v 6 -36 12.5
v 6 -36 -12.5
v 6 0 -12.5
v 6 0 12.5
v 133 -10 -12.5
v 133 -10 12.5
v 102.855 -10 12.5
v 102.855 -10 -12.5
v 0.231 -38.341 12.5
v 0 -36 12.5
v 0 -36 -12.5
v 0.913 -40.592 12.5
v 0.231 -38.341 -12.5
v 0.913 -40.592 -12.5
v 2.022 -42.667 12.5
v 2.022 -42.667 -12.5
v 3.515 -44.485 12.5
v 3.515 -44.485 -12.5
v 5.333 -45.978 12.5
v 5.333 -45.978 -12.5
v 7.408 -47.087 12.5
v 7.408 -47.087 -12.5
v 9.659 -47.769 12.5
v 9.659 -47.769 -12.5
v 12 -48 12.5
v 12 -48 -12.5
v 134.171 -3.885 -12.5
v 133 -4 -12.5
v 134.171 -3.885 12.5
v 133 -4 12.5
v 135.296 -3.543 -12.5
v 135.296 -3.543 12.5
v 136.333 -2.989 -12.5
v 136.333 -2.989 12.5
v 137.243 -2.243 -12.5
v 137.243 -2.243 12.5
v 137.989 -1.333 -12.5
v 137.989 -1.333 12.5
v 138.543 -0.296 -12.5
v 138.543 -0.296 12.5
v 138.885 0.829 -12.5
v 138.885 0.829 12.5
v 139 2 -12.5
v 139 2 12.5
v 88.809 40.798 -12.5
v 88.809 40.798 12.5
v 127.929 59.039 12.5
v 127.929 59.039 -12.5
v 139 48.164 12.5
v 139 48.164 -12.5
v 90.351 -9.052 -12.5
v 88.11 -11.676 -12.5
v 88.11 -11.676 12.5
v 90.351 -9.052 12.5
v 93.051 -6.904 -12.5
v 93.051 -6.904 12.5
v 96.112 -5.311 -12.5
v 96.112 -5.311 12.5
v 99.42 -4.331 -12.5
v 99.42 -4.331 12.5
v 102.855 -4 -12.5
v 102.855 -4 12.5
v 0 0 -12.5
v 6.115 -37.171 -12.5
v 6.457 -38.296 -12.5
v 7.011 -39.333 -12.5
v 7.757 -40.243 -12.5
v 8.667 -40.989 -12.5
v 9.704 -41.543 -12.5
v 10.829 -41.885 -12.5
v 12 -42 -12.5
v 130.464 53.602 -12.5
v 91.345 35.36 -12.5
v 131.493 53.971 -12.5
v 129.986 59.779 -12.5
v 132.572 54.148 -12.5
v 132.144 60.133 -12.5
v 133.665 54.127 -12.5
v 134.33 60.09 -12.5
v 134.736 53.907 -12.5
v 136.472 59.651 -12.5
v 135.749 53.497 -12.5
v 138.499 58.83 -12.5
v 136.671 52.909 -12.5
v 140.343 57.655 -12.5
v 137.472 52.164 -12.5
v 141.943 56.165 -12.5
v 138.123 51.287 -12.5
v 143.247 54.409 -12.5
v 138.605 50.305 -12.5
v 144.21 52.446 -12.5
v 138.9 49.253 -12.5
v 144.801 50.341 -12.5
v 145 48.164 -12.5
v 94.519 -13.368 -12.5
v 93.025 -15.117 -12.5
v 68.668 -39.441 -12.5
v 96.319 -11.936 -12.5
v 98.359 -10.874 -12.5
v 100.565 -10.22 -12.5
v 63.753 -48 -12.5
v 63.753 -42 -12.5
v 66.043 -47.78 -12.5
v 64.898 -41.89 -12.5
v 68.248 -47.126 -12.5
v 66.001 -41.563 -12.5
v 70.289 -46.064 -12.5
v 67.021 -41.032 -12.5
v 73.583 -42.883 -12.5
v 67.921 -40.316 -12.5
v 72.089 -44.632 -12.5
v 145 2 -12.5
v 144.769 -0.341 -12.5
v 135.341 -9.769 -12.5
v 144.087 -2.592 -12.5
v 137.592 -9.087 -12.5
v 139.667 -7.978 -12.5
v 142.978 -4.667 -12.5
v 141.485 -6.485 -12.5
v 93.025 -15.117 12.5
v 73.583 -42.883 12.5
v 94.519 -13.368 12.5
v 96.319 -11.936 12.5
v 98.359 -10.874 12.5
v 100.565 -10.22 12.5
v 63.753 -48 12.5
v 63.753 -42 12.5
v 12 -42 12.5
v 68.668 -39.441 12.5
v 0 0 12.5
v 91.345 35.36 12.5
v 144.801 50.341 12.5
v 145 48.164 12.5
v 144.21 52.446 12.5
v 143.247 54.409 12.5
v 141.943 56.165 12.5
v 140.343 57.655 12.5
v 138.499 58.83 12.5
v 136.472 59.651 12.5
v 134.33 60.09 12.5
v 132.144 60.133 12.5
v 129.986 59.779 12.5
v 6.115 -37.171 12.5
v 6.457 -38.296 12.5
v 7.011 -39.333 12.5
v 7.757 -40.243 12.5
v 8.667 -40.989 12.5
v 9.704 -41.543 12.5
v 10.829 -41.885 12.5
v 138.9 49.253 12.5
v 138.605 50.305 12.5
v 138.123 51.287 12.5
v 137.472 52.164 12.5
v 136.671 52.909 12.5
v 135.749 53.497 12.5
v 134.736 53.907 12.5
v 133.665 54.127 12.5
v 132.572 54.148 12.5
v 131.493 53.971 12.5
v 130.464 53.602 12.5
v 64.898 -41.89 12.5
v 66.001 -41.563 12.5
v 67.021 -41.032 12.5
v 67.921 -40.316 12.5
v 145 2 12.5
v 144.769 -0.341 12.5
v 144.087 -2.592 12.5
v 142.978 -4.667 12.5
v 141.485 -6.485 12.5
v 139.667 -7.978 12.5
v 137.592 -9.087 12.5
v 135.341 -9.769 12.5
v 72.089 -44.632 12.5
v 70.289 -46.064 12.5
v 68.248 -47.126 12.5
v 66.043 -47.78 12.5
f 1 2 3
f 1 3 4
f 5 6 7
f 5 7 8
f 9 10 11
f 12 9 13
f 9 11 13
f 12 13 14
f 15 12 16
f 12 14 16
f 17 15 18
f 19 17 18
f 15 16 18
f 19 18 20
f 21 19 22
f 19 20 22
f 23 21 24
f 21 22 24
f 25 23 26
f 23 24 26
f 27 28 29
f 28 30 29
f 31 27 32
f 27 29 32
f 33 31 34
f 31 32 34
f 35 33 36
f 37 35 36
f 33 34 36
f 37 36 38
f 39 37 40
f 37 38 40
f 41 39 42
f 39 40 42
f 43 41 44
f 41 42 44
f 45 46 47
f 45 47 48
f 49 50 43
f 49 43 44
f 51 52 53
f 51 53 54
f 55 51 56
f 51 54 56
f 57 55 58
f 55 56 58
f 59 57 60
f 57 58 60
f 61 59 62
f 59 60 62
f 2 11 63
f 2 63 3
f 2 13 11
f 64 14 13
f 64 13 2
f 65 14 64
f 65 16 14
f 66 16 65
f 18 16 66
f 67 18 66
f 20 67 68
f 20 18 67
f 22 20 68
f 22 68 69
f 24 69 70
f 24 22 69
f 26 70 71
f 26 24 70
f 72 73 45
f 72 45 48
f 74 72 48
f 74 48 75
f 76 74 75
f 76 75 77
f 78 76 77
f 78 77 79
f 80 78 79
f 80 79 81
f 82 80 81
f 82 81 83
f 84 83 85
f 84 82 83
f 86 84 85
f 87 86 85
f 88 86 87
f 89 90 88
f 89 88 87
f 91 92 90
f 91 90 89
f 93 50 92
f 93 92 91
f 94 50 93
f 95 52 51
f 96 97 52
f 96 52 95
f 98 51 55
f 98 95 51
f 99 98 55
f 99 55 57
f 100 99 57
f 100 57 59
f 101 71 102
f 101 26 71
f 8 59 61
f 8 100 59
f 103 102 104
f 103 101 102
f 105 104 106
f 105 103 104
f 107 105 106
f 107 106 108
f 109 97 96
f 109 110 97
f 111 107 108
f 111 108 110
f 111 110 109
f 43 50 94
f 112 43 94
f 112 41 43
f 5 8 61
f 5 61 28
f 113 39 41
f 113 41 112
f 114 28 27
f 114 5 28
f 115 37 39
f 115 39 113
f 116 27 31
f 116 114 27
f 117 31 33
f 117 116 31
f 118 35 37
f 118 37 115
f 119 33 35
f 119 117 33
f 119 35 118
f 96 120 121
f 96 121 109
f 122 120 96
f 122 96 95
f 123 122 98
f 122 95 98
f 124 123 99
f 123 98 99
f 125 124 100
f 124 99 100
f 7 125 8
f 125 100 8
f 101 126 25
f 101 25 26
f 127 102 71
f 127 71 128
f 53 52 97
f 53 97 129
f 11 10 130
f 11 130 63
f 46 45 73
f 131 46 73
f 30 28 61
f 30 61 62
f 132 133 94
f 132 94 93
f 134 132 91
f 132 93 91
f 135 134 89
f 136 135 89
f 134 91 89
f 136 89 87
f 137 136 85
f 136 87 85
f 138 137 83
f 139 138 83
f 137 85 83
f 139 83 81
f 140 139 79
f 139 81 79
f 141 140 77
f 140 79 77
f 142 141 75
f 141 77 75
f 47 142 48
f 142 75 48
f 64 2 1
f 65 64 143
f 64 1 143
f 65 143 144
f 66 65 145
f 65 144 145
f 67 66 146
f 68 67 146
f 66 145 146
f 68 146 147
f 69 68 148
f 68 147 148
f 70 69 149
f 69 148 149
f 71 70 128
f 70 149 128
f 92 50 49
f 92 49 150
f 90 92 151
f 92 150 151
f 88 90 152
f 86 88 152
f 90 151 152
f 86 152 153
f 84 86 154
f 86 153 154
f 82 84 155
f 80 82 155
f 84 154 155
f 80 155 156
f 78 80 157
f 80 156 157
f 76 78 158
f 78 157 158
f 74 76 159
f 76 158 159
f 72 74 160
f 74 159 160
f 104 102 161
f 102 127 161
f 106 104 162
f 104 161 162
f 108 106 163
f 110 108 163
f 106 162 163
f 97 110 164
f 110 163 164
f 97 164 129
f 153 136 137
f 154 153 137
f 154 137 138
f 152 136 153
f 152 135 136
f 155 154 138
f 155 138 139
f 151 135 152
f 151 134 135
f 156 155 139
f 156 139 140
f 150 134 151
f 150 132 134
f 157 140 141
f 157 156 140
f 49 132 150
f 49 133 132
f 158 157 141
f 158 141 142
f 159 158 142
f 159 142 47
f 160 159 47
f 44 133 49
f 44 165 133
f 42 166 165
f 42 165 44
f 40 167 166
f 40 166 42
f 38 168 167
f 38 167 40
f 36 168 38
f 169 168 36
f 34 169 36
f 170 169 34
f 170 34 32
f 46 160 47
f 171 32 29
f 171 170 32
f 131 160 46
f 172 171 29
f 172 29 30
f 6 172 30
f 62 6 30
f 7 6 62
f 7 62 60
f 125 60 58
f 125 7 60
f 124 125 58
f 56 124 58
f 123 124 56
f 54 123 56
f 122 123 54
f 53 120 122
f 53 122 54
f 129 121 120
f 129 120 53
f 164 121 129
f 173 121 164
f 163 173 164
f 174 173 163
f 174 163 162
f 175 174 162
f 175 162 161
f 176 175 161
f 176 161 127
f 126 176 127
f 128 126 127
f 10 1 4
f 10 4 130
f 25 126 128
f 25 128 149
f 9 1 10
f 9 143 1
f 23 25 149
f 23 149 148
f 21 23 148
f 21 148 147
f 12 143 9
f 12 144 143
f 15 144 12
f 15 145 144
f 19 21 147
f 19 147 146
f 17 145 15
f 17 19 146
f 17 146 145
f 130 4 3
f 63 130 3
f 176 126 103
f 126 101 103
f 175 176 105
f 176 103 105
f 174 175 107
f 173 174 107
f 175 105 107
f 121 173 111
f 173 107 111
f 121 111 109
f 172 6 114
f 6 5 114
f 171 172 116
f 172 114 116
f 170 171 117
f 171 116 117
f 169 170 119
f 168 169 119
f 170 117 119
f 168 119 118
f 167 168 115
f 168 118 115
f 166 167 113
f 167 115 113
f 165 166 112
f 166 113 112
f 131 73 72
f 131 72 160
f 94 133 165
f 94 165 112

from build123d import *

# Parameters (mm, degrees)
SKETCH2_W = 6
SKETCH2_H = 25


with BuildPart() as part:
    # Sweep1: sweep along a path in Sketch1
    with BuildLine(Plane.XY) as sweep1_path:
        Line((0, 0), (0, -36))
        ThreePointArc((0, -36), (3.514718626, -44.485281374), (12, -48))
        Line((12, -48), (63.753195393, -48))
        ThreePointArc((63.753195393, -48), (69.294178752, -46.644129998), (73.583019925, -42.882917236))
        Line((73.583019925, -42.882917236), (93.024866527, -15.117082764))
        ThreePointArc((93.024866527, -15.117082764), (97.3137077, -11.355870002), (102.854691059, -10))
        Line((102.854691059, -10), (133, -10))
        ThreePointArc((133, -10), (141.485281374, -6.485281374), (145, 2))
        Line((145, 2), (145, 48.163773075))
        ThreePointArc((145, 48.163773075), (139.4475953, 58.284470424), (127.928580859, 59.039466519))
        Line((127.928580859, 59.039466519), (88.808917204, 40.797667772))
    # Sketch2 → Sweep1 (sweep)
    with BuildSketch(Plane(origin=(0, 0, 0), x_dir=(-1, 0, 0), z_dir=(0, -1, 0))):
        with Locations((-3, 0)):
            Rectangle(SKETCH2_W, SKETCH2_H)
    sweep(path=sweep1_path.line)


solid = part.part
